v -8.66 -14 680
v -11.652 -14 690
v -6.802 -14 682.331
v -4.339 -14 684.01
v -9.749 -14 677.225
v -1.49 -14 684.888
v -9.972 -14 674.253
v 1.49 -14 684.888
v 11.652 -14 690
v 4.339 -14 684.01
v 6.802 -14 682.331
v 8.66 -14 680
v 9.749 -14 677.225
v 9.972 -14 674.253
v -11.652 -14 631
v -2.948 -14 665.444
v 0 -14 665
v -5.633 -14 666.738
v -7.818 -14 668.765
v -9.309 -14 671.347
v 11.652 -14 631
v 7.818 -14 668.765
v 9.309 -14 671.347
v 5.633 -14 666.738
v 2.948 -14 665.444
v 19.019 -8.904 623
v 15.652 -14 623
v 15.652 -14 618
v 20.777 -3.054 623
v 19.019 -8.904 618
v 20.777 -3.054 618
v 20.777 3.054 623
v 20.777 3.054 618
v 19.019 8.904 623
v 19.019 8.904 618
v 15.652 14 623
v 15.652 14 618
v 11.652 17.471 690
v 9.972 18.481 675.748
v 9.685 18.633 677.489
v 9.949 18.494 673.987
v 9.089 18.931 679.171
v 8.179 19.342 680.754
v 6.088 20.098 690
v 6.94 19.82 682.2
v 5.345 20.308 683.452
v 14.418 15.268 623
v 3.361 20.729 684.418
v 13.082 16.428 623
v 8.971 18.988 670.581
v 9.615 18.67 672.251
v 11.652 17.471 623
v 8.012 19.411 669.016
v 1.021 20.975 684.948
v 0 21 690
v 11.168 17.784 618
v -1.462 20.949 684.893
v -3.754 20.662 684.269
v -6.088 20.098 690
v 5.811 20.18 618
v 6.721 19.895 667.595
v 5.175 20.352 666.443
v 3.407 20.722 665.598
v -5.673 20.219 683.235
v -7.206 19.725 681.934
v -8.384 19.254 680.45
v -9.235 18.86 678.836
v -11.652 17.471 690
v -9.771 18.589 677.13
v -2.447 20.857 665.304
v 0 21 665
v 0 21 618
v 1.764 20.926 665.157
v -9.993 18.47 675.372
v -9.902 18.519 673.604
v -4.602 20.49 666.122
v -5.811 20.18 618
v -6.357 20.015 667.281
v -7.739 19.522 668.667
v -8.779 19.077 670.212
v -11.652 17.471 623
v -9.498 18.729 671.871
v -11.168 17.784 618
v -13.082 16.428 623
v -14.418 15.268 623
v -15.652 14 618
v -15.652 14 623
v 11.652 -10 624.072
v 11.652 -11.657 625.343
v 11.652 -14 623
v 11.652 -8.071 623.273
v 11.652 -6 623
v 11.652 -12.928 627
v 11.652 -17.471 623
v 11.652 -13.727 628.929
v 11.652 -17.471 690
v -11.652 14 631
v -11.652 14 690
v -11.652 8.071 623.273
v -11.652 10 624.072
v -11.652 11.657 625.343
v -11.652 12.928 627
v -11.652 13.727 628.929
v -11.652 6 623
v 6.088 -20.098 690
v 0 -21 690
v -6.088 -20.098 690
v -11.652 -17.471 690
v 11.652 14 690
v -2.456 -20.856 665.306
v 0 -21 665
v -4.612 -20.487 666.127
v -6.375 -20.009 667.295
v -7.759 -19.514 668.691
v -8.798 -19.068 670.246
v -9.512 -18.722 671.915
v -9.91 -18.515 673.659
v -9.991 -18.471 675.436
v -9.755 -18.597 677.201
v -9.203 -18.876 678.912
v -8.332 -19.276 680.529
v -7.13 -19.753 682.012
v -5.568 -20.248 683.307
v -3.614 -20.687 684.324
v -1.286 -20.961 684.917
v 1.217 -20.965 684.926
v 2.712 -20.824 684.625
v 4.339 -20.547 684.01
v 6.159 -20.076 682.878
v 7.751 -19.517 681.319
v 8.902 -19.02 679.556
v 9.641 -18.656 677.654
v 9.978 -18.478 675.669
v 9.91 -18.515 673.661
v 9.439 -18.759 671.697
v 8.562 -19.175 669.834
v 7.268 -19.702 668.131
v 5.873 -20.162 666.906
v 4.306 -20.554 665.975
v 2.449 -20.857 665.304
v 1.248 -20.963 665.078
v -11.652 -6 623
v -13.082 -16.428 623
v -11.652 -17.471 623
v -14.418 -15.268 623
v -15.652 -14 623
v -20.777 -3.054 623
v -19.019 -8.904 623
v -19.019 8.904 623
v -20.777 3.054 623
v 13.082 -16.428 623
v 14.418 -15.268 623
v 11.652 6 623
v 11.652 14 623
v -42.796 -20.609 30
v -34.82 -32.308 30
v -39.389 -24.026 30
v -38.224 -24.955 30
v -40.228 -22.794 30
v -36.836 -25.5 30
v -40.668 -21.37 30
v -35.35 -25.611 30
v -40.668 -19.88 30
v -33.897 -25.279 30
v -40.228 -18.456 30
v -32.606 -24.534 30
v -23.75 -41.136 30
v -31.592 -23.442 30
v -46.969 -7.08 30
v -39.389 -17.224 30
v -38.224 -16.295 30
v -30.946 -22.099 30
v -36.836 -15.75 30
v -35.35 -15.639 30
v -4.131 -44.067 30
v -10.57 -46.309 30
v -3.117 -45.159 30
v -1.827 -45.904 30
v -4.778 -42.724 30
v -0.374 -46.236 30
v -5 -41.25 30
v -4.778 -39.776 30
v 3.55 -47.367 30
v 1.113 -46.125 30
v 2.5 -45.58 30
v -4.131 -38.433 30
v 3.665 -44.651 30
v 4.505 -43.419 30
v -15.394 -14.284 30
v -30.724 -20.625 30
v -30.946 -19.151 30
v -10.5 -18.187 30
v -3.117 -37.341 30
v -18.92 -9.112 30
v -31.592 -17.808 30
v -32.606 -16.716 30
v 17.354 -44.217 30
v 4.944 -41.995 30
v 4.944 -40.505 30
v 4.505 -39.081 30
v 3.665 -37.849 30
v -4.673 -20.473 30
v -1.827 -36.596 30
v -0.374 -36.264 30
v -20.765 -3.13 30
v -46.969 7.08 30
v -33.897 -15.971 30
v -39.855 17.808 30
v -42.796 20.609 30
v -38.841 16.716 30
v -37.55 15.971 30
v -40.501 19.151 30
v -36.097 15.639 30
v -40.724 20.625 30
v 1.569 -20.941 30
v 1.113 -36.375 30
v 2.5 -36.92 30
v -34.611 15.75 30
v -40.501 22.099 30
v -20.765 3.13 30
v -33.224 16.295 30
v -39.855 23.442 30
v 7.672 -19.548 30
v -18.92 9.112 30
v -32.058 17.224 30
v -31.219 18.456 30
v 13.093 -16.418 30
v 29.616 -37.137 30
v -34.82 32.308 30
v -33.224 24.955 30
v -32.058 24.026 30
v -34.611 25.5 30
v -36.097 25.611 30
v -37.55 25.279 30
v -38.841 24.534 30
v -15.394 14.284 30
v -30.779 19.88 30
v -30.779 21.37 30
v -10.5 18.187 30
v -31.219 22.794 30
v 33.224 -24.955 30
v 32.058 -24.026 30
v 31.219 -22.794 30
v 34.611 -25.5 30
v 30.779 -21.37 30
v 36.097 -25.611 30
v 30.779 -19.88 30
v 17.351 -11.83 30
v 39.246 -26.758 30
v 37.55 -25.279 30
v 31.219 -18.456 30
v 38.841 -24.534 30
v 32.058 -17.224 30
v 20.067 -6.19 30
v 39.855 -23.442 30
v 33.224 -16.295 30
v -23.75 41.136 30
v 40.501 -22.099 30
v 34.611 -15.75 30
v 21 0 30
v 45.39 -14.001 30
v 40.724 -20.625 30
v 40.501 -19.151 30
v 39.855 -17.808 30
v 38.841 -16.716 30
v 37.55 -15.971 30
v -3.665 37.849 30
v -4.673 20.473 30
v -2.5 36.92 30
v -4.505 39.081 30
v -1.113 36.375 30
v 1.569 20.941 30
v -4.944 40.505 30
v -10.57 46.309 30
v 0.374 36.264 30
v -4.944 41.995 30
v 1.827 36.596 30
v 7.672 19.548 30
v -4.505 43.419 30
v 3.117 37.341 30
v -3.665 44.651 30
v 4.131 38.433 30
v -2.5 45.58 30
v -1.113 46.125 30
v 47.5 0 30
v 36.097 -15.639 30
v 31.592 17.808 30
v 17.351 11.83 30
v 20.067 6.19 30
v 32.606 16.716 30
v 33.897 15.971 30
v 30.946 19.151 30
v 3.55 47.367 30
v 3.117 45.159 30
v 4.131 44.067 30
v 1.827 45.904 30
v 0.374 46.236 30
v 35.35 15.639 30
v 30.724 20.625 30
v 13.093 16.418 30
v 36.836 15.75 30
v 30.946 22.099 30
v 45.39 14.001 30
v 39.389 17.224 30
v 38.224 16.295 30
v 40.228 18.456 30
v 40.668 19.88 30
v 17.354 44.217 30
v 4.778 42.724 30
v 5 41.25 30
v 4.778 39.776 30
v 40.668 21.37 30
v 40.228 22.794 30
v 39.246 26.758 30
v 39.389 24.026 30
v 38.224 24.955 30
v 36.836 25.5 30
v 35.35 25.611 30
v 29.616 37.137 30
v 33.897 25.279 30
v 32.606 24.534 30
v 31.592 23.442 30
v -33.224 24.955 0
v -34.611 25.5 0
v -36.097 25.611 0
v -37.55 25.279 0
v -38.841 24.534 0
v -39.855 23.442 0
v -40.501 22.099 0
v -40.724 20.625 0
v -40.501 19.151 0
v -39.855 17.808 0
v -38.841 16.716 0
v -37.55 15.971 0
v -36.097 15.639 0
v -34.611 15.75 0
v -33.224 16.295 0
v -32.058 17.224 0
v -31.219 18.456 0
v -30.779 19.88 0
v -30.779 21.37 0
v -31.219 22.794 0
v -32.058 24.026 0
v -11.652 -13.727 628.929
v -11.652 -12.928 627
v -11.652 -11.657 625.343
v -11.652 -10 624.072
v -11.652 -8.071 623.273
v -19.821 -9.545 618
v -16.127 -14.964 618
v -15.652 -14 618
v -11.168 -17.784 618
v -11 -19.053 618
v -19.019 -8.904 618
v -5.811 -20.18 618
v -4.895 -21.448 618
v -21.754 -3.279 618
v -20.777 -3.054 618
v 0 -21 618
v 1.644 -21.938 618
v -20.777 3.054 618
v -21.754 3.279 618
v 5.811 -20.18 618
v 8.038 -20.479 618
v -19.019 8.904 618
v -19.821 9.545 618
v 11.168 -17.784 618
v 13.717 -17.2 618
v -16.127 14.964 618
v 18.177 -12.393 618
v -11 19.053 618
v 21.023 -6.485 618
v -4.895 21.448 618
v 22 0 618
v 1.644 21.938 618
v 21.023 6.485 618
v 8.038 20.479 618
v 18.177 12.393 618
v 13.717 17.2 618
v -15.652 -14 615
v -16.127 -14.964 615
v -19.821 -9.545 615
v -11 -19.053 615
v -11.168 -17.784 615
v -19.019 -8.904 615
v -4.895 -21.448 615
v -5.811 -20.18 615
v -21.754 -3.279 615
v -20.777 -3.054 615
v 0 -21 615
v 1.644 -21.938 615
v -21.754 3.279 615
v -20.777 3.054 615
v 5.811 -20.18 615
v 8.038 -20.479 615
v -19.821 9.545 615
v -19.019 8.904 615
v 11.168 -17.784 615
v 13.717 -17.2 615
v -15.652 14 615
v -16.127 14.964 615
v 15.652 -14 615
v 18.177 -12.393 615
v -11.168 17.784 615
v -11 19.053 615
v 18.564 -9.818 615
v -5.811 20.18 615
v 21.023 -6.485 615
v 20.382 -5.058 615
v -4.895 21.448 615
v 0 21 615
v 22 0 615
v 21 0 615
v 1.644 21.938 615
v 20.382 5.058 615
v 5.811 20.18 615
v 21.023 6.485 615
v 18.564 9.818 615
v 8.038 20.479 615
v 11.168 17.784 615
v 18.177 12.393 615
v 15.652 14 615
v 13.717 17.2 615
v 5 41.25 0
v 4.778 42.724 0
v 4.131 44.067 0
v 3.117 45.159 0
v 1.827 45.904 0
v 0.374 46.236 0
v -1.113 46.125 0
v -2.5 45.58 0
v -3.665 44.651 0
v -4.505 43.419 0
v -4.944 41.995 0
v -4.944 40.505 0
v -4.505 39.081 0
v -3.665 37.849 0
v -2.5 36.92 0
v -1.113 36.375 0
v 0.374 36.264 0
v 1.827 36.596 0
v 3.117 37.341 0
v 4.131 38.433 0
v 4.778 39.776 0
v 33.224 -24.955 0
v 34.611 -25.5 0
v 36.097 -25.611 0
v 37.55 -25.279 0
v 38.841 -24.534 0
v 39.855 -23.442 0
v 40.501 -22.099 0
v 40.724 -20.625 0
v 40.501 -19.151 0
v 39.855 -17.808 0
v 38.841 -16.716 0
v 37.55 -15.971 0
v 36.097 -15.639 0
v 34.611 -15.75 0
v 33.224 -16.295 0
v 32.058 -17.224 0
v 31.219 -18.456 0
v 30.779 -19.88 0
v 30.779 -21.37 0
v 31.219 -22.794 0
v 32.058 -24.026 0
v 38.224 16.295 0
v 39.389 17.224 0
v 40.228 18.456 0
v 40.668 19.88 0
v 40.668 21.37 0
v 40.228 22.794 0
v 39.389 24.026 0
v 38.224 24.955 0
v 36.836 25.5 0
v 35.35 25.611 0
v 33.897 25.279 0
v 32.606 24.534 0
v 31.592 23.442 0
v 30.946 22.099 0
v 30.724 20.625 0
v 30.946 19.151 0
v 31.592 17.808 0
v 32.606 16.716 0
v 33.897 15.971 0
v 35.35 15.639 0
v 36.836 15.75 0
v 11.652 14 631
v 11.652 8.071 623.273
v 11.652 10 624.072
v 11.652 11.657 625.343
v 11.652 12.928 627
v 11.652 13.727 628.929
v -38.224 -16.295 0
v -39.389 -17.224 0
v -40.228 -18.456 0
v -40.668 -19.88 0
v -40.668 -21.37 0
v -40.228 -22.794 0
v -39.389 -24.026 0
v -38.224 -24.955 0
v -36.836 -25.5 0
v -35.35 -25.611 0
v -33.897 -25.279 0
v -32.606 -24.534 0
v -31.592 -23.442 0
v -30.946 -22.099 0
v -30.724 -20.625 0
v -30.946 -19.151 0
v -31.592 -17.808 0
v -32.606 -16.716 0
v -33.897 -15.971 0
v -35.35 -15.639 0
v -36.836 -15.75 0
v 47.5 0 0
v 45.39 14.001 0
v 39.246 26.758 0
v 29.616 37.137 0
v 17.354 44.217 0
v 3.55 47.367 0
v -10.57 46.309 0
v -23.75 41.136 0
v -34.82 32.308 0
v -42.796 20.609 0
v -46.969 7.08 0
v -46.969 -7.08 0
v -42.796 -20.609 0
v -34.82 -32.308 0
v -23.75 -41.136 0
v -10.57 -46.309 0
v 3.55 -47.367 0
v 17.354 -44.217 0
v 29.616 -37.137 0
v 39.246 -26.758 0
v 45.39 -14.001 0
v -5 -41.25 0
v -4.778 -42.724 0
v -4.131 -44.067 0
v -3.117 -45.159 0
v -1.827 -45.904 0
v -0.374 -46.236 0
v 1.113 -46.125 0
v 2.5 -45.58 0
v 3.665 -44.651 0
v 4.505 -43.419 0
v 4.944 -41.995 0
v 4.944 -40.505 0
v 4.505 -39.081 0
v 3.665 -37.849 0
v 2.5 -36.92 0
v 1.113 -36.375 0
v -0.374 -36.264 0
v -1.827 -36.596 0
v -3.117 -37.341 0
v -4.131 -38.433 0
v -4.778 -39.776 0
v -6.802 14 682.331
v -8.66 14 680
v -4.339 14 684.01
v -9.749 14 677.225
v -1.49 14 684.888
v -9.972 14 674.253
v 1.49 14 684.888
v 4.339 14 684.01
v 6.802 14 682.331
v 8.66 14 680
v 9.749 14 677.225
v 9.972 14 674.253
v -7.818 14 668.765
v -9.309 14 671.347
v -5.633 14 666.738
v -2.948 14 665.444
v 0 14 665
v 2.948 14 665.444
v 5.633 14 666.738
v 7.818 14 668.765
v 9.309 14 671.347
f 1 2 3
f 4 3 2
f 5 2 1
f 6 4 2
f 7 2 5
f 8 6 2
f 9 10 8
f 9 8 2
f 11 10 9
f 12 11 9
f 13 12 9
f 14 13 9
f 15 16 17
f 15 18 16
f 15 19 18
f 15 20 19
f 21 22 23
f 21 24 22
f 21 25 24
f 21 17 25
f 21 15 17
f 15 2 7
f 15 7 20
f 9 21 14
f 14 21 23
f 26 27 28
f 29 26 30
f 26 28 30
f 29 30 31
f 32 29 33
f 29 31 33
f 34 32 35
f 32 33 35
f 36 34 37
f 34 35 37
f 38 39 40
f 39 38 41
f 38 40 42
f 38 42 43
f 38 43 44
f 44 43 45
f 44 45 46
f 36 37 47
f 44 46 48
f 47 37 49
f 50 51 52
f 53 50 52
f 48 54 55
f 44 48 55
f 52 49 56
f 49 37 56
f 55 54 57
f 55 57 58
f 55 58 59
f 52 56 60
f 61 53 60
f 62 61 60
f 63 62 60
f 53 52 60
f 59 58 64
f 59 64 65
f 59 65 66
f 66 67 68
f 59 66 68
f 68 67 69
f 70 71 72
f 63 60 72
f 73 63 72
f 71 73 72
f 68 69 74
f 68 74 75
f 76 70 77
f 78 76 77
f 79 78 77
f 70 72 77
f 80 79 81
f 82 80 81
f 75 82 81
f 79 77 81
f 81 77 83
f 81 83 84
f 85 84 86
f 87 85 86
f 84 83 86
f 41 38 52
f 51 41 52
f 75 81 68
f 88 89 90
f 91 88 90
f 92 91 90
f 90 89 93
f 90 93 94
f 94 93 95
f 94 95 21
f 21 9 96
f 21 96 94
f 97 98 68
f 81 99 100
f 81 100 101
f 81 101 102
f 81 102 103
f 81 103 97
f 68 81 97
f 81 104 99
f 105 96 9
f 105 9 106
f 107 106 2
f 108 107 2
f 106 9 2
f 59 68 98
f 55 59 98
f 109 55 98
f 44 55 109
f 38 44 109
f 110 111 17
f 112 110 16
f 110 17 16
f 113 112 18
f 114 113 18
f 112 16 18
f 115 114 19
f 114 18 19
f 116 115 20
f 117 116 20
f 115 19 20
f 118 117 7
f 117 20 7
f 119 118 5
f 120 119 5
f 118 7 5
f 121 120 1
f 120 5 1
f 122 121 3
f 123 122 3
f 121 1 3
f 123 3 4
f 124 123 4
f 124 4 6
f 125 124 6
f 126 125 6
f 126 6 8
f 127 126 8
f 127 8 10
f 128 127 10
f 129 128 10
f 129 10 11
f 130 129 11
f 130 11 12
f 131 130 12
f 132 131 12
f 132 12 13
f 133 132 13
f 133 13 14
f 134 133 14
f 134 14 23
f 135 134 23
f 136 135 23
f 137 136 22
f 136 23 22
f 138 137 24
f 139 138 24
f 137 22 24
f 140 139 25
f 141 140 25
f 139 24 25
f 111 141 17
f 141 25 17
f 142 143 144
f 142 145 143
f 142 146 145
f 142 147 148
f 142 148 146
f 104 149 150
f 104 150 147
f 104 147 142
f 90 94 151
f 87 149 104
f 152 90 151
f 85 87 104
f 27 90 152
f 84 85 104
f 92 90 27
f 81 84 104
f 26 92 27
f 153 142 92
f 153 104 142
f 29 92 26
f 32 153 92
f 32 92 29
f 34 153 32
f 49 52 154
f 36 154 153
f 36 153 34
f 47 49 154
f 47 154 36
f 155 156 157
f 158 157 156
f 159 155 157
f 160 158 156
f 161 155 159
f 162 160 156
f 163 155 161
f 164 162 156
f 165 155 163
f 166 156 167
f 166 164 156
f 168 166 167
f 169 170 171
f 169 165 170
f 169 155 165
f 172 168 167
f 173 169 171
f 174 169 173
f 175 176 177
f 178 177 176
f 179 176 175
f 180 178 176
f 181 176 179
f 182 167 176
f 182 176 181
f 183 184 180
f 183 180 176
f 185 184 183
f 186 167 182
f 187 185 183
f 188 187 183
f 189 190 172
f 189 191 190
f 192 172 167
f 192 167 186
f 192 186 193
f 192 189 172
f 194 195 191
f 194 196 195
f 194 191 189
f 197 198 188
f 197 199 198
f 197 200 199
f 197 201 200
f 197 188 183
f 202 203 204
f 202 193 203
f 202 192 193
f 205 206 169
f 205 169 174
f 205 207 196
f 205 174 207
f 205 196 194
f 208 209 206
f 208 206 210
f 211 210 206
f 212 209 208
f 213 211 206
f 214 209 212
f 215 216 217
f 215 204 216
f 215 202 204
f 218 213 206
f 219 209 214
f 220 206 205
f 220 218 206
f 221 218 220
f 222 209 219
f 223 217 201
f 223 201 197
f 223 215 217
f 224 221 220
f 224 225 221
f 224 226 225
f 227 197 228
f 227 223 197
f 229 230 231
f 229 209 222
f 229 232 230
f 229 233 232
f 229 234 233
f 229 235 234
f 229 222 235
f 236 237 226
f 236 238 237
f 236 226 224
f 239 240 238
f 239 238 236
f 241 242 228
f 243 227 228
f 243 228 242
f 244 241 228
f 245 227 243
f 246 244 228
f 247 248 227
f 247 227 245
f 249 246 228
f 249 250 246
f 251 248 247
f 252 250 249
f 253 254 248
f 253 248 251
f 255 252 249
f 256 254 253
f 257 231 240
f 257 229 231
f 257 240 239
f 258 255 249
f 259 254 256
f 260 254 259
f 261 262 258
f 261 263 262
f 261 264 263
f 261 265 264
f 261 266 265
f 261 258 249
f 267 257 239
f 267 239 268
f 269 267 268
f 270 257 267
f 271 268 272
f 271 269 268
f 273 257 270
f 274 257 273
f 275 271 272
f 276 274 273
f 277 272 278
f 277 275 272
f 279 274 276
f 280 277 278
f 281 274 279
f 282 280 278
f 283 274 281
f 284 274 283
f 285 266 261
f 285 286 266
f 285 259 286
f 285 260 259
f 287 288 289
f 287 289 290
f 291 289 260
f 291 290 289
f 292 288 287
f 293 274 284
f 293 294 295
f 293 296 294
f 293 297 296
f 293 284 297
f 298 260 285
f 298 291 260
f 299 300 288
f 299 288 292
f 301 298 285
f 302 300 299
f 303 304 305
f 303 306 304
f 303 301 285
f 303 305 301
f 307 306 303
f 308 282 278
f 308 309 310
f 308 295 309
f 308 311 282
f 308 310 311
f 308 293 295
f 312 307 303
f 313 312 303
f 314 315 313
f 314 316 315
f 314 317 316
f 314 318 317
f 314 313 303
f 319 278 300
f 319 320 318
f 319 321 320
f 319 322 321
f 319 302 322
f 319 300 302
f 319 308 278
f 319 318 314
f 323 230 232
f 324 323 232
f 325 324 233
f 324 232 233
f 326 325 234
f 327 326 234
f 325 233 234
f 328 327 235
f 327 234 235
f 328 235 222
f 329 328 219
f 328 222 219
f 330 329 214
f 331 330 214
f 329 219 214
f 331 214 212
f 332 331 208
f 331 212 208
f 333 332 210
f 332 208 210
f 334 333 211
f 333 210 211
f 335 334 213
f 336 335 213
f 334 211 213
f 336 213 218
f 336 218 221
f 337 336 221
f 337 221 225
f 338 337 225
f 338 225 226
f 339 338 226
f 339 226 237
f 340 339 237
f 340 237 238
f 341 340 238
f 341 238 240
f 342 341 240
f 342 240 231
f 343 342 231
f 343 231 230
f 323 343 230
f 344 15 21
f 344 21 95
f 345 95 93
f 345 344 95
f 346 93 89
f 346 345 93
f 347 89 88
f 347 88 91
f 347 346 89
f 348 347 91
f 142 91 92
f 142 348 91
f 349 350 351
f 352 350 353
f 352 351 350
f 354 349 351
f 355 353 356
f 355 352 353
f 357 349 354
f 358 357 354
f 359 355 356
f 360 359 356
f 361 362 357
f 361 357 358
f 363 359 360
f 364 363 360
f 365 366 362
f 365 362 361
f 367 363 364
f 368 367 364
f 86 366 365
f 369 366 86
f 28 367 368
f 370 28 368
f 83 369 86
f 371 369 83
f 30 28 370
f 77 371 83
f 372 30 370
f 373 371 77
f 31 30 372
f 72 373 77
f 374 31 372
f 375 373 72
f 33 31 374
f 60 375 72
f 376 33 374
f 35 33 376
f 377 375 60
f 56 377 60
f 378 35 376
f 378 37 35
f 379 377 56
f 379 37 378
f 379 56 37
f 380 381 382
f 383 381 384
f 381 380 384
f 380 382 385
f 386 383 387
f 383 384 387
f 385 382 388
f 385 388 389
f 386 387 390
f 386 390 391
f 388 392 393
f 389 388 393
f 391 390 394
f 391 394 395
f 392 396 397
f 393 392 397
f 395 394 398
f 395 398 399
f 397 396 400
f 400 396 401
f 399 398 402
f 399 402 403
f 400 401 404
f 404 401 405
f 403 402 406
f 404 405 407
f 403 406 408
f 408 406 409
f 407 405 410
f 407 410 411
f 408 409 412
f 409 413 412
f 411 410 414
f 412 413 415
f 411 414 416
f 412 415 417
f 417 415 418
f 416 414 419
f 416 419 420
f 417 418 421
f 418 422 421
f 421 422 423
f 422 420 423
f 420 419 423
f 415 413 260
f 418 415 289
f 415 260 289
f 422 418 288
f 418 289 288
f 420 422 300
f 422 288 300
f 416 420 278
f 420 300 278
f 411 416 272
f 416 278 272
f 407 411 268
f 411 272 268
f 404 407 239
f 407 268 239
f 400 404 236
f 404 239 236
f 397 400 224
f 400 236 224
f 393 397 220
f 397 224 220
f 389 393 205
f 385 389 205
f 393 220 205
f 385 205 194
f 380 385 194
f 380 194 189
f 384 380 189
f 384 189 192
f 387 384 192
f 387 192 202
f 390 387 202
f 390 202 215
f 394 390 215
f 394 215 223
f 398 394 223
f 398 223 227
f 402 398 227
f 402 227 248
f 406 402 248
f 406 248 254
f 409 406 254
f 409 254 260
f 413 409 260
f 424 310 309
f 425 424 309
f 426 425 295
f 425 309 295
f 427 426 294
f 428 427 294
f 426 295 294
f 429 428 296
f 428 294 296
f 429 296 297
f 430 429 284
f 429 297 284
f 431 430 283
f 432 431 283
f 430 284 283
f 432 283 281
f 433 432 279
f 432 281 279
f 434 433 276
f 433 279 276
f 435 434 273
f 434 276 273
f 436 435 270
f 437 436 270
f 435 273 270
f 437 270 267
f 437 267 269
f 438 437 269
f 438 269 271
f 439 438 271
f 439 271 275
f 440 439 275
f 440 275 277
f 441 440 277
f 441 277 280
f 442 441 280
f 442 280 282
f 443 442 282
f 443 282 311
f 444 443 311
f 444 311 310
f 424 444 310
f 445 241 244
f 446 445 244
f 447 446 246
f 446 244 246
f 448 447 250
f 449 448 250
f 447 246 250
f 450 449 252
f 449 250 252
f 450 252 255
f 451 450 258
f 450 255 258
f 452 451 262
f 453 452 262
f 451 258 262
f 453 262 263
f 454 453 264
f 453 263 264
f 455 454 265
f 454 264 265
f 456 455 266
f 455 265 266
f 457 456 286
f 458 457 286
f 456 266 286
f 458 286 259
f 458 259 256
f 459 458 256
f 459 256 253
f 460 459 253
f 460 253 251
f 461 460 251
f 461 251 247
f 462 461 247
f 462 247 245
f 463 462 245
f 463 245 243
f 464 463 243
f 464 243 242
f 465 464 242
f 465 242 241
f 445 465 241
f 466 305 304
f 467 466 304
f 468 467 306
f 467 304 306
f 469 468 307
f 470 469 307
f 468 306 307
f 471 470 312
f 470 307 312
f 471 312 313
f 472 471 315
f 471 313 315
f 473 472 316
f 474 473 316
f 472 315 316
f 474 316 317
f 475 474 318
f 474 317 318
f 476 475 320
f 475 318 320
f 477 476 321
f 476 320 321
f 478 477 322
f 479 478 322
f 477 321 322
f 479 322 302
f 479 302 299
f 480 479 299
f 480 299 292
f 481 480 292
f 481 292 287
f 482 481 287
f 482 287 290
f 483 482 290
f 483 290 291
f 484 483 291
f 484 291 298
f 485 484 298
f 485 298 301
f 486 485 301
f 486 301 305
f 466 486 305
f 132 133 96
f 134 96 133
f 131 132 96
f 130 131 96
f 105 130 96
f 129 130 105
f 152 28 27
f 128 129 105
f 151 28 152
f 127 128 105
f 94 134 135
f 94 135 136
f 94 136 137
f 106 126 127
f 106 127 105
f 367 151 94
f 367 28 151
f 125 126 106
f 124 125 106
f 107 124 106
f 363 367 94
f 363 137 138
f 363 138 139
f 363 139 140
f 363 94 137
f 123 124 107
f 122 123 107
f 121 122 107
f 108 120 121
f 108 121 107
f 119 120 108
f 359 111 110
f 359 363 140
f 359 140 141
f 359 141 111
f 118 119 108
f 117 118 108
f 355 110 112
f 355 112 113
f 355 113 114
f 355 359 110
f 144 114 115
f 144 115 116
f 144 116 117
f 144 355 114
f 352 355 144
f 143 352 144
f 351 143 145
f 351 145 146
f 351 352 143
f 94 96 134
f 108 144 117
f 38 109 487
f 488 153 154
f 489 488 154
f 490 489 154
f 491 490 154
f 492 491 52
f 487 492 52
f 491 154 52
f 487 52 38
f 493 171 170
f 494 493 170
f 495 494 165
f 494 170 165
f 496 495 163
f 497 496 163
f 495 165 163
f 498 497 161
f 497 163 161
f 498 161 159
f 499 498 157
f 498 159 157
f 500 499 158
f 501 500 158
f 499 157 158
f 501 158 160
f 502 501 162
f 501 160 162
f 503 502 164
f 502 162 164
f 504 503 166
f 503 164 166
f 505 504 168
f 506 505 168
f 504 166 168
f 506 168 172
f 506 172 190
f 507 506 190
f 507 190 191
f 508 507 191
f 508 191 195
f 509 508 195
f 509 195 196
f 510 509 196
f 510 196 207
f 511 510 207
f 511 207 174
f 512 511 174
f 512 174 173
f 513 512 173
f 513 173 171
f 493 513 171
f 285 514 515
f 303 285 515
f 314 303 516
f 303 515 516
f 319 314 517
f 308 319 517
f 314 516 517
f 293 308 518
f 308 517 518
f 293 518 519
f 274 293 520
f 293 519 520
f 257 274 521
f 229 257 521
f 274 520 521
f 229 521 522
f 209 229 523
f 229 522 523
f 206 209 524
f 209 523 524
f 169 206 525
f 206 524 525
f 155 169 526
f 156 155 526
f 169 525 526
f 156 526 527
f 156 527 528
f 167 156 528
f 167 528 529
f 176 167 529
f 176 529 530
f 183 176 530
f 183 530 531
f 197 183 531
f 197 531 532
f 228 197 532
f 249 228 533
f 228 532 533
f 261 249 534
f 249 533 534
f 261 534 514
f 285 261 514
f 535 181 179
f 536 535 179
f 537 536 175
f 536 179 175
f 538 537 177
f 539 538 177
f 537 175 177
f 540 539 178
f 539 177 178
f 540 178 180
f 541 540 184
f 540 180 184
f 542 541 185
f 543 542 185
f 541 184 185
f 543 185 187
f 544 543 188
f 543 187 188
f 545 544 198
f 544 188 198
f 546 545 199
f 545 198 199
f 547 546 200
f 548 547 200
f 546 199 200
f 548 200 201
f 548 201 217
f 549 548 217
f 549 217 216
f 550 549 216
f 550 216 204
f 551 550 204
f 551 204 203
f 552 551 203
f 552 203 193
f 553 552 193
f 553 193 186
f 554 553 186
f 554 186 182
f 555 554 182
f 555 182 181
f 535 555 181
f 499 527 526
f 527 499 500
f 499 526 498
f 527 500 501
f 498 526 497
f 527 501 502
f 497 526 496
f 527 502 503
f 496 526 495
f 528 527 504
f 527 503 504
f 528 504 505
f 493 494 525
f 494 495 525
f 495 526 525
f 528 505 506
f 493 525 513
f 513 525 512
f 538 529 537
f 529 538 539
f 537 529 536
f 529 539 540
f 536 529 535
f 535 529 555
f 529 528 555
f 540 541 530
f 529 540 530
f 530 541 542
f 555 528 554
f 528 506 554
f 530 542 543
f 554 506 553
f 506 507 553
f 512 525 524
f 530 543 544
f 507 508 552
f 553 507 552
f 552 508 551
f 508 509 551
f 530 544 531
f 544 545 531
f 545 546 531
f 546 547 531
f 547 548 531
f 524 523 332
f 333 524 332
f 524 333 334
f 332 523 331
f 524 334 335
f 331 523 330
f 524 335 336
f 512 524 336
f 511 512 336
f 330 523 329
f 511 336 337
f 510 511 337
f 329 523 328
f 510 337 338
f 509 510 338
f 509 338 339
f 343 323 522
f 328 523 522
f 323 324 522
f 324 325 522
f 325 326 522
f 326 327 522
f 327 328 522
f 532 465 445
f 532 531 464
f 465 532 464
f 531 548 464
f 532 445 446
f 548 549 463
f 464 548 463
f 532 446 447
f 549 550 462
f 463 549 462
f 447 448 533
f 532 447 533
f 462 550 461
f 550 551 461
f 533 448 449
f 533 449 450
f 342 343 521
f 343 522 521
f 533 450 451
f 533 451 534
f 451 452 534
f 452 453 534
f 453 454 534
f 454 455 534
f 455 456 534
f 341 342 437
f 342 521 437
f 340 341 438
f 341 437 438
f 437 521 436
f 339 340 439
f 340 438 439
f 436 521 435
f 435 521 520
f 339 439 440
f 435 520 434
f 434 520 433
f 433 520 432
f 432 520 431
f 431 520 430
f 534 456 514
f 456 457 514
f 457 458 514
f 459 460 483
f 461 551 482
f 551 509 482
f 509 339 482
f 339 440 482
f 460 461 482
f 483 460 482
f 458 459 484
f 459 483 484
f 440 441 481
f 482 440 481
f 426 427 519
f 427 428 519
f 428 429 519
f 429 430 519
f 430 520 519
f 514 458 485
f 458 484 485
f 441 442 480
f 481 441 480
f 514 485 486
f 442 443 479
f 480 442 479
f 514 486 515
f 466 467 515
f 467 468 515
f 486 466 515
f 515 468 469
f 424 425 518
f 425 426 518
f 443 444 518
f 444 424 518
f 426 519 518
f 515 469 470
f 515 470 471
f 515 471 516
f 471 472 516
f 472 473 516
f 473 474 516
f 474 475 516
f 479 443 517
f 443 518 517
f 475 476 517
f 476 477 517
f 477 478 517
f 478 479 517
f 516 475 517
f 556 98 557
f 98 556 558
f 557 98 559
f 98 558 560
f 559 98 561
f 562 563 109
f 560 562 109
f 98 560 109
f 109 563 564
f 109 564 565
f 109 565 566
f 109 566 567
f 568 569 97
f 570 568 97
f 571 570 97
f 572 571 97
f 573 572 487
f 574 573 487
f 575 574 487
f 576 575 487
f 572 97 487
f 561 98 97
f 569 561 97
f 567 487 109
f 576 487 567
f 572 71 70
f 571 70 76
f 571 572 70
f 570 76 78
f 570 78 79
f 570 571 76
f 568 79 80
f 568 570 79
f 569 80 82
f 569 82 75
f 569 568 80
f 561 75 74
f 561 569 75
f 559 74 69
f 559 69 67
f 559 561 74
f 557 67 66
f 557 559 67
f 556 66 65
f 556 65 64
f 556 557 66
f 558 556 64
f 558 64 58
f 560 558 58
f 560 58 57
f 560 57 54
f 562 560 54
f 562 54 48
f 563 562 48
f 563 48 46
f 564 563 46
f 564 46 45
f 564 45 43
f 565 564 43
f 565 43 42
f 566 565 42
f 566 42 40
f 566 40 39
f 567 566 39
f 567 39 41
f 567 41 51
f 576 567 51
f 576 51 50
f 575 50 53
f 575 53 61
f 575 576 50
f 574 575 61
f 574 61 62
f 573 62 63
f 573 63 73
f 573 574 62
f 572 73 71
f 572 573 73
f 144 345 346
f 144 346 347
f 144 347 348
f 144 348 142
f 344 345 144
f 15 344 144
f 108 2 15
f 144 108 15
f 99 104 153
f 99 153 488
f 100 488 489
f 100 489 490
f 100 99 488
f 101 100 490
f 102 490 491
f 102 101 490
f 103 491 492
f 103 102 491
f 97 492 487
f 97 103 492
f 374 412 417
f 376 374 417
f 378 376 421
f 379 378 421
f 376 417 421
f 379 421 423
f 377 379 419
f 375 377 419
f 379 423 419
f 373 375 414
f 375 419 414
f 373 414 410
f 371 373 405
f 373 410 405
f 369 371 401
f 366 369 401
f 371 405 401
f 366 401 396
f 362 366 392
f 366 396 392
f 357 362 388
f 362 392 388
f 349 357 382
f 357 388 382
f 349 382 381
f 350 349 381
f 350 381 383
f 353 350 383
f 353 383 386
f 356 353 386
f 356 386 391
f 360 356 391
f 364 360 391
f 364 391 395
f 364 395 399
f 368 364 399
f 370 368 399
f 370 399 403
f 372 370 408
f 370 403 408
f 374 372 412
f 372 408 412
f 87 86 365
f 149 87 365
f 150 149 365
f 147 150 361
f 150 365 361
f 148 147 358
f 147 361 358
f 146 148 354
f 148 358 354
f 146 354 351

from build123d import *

# Parameters (mm, degrees)
SZKIC1_R                               = 47.5
DODANIE_WYCI_GNI_CIE1_DEPTH            = 30
WYTNIJ_WYCI_GNI_CIE1_REACH             = 75.57
SZKIC2_R                               = 5
SZYK_KO_OWY1_COUNT                     = 6
SZKIC3_R                               = 21
DODANIE_WYCI_GNI_CIE2_DEPTH            = 585
DODANIE_WYCI_GNI_CIE3_DEPTH            = 75
SZKIC5_R                               = 22
DODANIE_WYCI_GNI_CIE4_DEPTH            = 3
SZKIC7_R                               = 21
DODANIE_WYCI_GNI_CIE5_DEPTH            = 5
WYTNIJ_WYCI_GNI_CIE2_REACH             = 696.362
SZKIC8_R                               = 10
WYTNIJ_WYCI_GNI_CIE2_DIRECTION_2_DEPTH = 695.361937321
WYTNIJ_WYCI_GNI_CIE3_START             = -67
WYTNIJ_WYCI_GNI_CIE3_DEPTH             = 67
ZAOKR_GLENIE1_R                        = 8


with BuildPart() as part:
    # Szkic1 → Dodanie-wyciągnięcie1 (new body)
    with BuildSketch(Plane.XY):
        Circle(SZKIC1_R)
    extrude(amount=DODANIE_WYCI_GNI_CIE1_DEPTH)

    # Szkic2 → Wytnij-wyciągnięcie1 (cut, up to next)
    with BuildSketch(Plane.XY.offset(30), mode=Mode.PRIVATE) as wytnij_wyci_gni_cie1_sk1:
        with Locations((0, 41.25)):
            Circle(SZKIC2_R)
    wytnij_wyci_gni_cie1_tool1 = extrude(wytnij_wyci_gni_cie1_sk1.sketch, amount=-WYTNIJ_WYCI_GNI_CIE1_REACH, mode=Mode.PRIVATE) & part.part
    wytnij_wyci_gni_cie1 = wytnij_wyci_gni_cie1_tool1.solids().sort_by_distance((0, 41.25, 30))[0]
    add(wytnij_wyci_gni_cie1, mode=Mode.SUBTRACT)

    # Szyk kołowy1: Wytnij-wyciągnięcie1 ×6 about axis
    szyk_ko_owy1_axis = Axis((0, 0, 0), (0, 0, 1))
    for i in range(1, SZYK_KO_OWY1_COUNT):
        add(wytnij_wyci_gni_cie1.rotate(szyk_ko_owy1_axis, i * 360 / SZYK_KO_OWY1_COUNT), mode=Mode.SUBTRACT)

    # Szkic3 → Dodanie-wyciągnięcie2 (add)
    with BuildSketch(Plane.XY.offset(30)):
        Circle(SZKIC3_R)
    extrude(amount=DODANIE_WYCI_GNI_CIE2_DEPTH)

    # Szkic4 → Dodanie-wyciągnięcie3 (add)
    with BuildSketch(Plane.XY.offset(615)):
        with BuildLine():
            Line((-15.652475842, 14), (15.652475842, 14))
            ThreePointArc((15.652475842, 14), (0, 21), (-15.652475842, 14))
        make_face()
        with BuildLine():
            Line((-15.652475842, -14), (15.652475842, -14))
            ThreePointArc((15.652475842, -14), (0, -21), (-15.652475842, -14))
        make_face()
    extrude(amount=DODANIE_WYCI_GNI_CIE3_DEPTH)

    # Szkic5 → Dodanie-wyciągnięcie4 (add)
    with BuildSketch(Plane.XY.offset(615)):
        Circle(SZKIC5_R)
    extrude(amount=DODANIE_WYCI_GNI_CIE4_DEPTH)

    # Szkic7 → Dodanie-wyciągnięcie5 (add)
    with BuildSketch(Plane.XY.offset(618)):
        Circle(SZKIC7_R)
    extrude(amount=DODANIE_WYCI_GNI_CIE5_DEPTH)

    # Szkic8 → Wytnij-wyciągnięcie2 (cut, up to next)
    with BuildSketch(Plane(origin=(0, -14, 0), x_dir=(1, 0, 0), z_dir=(0, 1, 0)), mode=Mode.PRIVATE) as wytnij_wyci_gni_cie2_sk1:
        with Locations(Location((0, -675, 0), (0, 0, 90))):
            Circle(SZKIC8_R)
    wytnij_wyci_gni_cie2_tool1 = extrude(wytnij_wyci_gni_cie2_sk1.sketch, amount=-WYTNIJ_WYCI_GNI_CIE2_REACH, mode=Mode.PRIVATE) & part.part
    add(wytnij_wyci_gni_cie2_tool1.solids().sort_by_distance((0, -14, 675))[0], mode=Mode.SUBTRACT)

    # Szkic8 → Wytnij-wyciągnięcie2 direction 2 (cut)
    with BuildSketch(Plane(origin=(0, -14, 0), x_dir=(1, 0, 0), z_dir=(0, 1, 0))):
        with Locations(Location((0, -675, 0), (0, 0, 90))):
            Circle(SZKIC8_R)
    extrude(amount=WYTNIJ_WYCI_GNI_CIE2_DIRECTION_2_DEPTH, mode=Mode.SUBTRACT)

    # Szkic9 → Wytnij-wyciągnięcie3 (cut)
    with BuildSketch(Plane.XY.offset(690).offset(WYTNIJ_WYCI_GNI_CIE3_START)):
        with BuildLine():
            Line((-11.652475842, 14), (-11.652475842, 17.470541112))
            ThreePointArc((-11.652475842, 17.470541112), (-13.762313052, 15.861864312), (-15.652475842, 14))
            Line((-15.652475842, 14), (-11.652475842, 14))
        make_face()
        with BuildLine():
            Line((15.652475842, 14), (11.652475842, 14))
            Line((11.652475842, 14), (11.652475842, 17.470541112))
            ThreePointArc((11.652475842, 17.470541112), (13.762313052, 15.861864312), (15.652475842, 14))
        make_face()
        with BuildLine():
            Line((11.652475842, -14), (11.652475842, -17.470541112))
            ThreePointArc((11.652475842, -17.470541112), (13.762313052, -15.861864312), (15.652475842, -14))
            Line((15.652475842, -14), (11.652475842, -14))
        make_face()
        with BuildLine():
            Line((-15.652475842, -14), (-11.652475842, -14))
            Line((-11.652475842, -14), (-11.652475842, -17.470541112))
            ThreePointArc((-11.652475842, -17.470541112), (-13.762313052, -15.861864312), (-15.652475842, -14))
        make_face()
    extrude(amount=WYTNIJ_WYCI_GNI_CIE3_DEPTH, mode=Mode.SUBTRACT)

    # Zaokrąglenie1
    # the kernel refuses this fillet: 8 mm, written as the material it adds along each edge
    with BuildSketch(Plane(origin=(-11.652475842, -14, 623), x_dir=(0, 1, 0), z_dir=(1, 0, 0))) as zaokr_glenie1_piece_1:
        with BuildLine():
            CenterArc((ZAOKR_GLENIE1_R, ZAOKR_GLENIE1_R), ZAOKR_GLENIE1_R, 180, 90)
            Line((0, ZAOKR_GLENIE1_R), (0, 0))
            Line((0, 0), (ZAOKR_GLENIE1_R, 0))
        make_face()
    extrude(amount=23.304951685)
    with BuildSketch(Plane(origin=(-11.652475842, 14, 623), x_dir=(0, -1, 0), z_dir=(1, 0, 0))) as zaokr_glenie1_piece_2:
        with BuildLine():
            CenterArc((ZAOKR_GLENIE1_R, -ZAOKR_GLENIE1_R), ZAOKR_GLENIE1_R, 90, 90)
            Line((0, -ZAOKR_GLENIE1_R), (0, 0))
            Line((0, 0), (ZAOKR_GLENIE1_R, 0))
        make_face()
    extrude(amount=23.304951685)


solid = part.part
